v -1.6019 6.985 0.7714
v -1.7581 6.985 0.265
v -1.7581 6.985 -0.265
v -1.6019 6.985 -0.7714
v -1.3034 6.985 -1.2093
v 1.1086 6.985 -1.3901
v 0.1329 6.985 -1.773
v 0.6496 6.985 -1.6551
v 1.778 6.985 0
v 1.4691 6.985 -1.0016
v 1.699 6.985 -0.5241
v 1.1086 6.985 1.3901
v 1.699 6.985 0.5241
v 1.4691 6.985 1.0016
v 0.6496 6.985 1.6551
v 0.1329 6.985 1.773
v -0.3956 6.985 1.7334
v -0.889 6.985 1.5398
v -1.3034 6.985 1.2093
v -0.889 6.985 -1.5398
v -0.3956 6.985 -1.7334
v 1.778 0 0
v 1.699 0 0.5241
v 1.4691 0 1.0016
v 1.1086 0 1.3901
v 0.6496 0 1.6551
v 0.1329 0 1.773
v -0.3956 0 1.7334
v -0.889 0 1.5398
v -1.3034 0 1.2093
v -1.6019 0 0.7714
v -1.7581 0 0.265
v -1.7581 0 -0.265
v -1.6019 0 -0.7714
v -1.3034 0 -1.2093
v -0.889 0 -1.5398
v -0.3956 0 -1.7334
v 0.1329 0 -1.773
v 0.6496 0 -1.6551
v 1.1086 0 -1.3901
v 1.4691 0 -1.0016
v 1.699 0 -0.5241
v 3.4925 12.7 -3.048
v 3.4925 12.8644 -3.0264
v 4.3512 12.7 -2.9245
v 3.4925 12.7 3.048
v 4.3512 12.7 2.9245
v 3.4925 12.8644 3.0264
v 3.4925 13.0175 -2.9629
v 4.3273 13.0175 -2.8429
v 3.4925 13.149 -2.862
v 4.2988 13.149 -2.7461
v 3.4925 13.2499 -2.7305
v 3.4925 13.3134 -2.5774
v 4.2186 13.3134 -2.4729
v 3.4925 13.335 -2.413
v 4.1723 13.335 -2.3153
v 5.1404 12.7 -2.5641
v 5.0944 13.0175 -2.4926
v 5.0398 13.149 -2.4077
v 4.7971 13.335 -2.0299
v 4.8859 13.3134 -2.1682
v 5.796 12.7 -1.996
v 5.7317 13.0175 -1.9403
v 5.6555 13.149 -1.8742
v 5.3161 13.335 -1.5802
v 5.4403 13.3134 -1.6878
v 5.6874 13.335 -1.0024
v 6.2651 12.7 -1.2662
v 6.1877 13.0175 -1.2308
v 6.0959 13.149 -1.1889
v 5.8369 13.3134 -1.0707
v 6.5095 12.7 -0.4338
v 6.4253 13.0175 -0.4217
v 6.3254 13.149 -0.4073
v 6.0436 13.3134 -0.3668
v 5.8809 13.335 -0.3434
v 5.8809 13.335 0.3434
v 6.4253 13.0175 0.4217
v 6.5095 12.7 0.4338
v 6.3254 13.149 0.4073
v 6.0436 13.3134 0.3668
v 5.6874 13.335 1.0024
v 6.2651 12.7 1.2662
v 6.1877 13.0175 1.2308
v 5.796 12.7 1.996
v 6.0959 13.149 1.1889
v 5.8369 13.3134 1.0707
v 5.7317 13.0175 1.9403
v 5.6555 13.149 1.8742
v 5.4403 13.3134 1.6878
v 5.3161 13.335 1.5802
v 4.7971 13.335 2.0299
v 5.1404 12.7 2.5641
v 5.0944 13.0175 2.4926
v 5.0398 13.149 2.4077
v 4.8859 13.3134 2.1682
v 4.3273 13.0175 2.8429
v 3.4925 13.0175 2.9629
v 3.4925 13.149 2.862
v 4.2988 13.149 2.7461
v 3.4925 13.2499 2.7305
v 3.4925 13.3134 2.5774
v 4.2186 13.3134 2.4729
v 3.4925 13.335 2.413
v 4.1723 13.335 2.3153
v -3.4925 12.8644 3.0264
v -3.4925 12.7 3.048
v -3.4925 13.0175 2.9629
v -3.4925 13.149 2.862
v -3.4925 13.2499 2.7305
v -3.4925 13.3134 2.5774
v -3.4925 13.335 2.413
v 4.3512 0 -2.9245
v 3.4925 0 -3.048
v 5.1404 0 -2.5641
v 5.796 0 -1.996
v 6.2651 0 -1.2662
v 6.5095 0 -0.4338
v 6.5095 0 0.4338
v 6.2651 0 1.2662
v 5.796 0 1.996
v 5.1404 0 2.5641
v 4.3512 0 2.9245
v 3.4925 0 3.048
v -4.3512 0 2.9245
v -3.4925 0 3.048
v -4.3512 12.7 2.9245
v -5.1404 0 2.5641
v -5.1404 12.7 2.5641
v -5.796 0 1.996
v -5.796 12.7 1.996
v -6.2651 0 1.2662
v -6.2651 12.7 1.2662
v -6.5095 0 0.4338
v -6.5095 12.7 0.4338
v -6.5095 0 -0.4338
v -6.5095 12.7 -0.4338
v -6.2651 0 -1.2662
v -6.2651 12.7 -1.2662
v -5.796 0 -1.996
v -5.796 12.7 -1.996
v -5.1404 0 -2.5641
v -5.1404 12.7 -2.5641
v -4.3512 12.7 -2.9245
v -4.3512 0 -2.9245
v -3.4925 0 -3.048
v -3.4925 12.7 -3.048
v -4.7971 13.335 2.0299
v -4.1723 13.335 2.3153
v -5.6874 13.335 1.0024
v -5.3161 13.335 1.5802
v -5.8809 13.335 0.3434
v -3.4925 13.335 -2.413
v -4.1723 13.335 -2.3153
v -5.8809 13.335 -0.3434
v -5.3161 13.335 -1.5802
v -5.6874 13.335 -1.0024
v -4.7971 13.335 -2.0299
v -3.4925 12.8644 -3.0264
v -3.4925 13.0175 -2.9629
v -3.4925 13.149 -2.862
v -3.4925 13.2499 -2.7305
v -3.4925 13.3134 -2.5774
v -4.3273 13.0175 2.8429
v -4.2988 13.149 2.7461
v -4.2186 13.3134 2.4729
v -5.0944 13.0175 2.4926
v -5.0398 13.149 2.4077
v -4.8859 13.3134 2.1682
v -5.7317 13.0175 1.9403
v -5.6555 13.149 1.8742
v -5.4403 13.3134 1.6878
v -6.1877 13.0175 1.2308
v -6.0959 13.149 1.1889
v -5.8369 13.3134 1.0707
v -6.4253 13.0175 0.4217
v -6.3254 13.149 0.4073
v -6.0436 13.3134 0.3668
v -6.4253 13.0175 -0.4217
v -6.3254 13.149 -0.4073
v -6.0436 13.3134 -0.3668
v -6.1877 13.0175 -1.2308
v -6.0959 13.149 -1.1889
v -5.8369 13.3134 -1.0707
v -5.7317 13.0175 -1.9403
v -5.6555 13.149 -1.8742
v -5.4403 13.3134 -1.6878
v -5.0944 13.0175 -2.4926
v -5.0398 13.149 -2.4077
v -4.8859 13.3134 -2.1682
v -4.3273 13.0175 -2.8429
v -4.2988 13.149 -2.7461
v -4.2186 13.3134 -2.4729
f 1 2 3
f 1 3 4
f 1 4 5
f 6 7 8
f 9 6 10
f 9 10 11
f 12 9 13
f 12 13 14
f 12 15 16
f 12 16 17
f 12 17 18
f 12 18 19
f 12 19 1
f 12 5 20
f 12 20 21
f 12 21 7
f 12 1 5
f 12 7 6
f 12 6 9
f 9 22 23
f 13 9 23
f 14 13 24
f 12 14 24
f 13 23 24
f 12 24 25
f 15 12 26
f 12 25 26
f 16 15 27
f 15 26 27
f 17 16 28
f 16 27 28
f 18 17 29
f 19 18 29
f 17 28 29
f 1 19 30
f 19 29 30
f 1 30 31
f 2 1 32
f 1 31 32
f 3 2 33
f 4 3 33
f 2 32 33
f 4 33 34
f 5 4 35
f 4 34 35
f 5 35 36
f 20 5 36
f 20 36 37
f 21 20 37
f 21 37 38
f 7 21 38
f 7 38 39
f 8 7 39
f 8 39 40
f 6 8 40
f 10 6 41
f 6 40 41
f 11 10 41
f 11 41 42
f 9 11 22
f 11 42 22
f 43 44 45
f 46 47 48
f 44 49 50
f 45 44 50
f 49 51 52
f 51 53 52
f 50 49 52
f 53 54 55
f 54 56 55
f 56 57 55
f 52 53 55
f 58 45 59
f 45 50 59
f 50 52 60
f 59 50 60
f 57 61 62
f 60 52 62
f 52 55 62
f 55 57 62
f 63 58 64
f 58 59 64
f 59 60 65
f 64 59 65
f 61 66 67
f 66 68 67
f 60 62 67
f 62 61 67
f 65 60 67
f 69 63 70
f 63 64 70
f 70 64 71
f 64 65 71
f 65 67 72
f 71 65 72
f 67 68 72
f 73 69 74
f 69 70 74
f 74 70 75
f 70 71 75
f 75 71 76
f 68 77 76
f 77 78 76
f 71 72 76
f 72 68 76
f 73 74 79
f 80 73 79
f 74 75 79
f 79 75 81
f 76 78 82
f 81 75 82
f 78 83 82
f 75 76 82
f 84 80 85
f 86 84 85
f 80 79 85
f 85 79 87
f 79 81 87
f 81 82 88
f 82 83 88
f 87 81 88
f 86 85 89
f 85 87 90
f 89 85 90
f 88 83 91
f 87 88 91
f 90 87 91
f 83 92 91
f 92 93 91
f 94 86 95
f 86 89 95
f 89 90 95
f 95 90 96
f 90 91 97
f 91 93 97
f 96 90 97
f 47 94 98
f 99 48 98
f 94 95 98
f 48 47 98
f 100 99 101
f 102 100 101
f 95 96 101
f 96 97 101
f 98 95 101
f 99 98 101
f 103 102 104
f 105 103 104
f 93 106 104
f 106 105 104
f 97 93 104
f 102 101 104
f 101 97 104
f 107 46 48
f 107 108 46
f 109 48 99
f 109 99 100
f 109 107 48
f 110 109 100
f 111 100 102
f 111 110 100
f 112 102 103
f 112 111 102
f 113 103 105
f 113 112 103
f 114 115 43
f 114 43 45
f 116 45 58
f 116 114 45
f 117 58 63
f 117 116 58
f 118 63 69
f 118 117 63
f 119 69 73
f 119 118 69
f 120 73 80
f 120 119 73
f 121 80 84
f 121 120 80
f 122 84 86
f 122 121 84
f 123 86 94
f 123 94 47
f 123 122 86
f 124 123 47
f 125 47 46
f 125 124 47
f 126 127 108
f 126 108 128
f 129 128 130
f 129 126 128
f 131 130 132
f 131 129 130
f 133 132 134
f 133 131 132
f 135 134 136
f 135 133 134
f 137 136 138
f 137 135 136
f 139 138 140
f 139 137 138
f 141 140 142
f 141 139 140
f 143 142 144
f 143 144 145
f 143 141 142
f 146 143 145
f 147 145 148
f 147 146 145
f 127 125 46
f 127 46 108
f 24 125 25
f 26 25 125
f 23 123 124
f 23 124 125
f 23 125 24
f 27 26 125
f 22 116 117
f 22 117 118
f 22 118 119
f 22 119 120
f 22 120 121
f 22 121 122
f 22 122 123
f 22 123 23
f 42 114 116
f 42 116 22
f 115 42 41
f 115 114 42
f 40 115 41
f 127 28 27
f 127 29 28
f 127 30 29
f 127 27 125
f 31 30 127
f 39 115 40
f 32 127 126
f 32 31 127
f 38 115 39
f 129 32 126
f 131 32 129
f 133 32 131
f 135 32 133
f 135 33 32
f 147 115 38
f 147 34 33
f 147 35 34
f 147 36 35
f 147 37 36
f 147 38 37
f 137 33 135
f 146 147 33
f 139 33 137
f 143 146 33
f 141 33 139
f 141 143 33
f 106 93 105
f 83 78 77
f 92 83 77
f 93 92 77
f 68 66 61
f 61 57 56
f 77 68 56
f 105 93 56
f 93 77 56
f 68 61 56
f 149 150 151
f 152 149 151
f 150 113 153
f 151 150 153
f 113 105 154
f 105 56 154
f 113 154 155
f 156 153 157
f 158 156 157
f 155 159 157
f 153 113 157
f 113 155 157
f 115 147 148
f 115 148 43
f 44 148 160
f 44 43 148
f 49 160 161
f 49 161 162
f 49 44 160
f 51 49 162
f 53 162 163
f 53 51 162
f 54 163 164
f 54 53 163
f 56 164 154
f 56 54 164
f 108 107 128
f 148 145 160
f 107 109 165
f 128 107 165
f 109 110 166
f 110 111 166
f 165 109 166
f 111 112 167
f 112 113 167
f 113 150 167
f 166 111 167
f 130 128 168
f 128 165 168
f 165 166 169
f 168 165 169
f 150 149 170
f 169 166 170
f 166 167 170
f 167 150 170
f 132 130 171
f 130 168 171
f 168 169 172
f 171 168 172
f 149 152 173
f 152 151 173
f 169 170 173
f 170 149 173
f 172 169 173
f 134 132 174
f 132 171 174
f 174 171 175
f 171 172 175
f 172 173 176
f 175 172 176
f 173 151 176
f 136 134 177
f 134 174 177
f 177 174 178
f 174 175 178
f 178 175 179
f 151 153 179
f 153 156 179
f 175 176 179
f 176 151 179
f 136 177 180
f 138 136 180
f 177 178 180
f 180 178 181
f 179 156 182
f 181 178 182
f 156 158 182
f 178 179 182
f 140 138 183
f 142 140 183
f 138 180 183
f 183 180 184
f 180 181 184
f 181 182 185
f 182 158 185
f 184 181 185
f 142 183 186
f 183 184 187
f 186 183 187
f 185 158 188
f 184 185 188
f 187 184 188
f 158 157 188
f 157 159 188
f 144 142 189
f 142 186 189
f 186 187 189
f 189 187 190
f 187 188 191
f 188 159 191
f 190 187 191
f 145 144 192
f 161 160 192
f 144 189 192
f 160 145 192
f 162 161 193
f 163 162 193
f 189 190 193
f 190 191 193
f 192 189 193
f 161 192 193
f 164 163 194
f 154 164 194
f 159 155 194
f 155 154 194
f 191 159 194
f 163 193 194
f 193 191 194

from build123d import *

# Parameters (mm, degrees)
BOSS_EXTRUDE1_DEPTH = 13.335
FILLET1_R           = 0.635
SKETCH2_R           = 1.778
CUT_EXTRUDE3_DEPTH  = 6.985


with BuildPart() as part:
    # Sketch1 → Boss-Extrude1 (new body)
    with BuildSketch(Plane(origin=(0, 0, 0), x_dir=(1, 0, 0), z_dir=(0, 1, 0))):
        with BuildLine():
            Line((-3.4925, 3.048), (3.4925, 3.048))
            ThreePointArc((3.4925, 3.048), (6.5405, 0), (3.4925, -3.048))
            Line((3.4925, -3.048), (-3.4925, -3.048))
            ThreePointArc((-3.4925, -3.048), (-6.5405, 0), (-3.4925, 3.048))
        make_face()
    extrude(amount=BOSS_EXTRUDE1_DEPTH)

    # Fillet1
    fillet1_edges = [part.edges().sort_by_distance(p)[0] for p in [
        (6.5405, 13.335, 0),
        (0, 13.335, -3.048),
        (-6.5405, 13.335, 0),
        (0, 13.335, 3.048),
    ]]
    fillet(fillet1_edges, radius=FILLET1_R)

    # Sketch2 → Cut-Extrude3 (cut)
    with BuildSketch(Plane.XZ):
        Circle(SKETCH2_R)
    extrude(amount=-CUT_EXTRUDE3_DEPTH, mode=Mode.SUBTRACT)


solid = part.part
